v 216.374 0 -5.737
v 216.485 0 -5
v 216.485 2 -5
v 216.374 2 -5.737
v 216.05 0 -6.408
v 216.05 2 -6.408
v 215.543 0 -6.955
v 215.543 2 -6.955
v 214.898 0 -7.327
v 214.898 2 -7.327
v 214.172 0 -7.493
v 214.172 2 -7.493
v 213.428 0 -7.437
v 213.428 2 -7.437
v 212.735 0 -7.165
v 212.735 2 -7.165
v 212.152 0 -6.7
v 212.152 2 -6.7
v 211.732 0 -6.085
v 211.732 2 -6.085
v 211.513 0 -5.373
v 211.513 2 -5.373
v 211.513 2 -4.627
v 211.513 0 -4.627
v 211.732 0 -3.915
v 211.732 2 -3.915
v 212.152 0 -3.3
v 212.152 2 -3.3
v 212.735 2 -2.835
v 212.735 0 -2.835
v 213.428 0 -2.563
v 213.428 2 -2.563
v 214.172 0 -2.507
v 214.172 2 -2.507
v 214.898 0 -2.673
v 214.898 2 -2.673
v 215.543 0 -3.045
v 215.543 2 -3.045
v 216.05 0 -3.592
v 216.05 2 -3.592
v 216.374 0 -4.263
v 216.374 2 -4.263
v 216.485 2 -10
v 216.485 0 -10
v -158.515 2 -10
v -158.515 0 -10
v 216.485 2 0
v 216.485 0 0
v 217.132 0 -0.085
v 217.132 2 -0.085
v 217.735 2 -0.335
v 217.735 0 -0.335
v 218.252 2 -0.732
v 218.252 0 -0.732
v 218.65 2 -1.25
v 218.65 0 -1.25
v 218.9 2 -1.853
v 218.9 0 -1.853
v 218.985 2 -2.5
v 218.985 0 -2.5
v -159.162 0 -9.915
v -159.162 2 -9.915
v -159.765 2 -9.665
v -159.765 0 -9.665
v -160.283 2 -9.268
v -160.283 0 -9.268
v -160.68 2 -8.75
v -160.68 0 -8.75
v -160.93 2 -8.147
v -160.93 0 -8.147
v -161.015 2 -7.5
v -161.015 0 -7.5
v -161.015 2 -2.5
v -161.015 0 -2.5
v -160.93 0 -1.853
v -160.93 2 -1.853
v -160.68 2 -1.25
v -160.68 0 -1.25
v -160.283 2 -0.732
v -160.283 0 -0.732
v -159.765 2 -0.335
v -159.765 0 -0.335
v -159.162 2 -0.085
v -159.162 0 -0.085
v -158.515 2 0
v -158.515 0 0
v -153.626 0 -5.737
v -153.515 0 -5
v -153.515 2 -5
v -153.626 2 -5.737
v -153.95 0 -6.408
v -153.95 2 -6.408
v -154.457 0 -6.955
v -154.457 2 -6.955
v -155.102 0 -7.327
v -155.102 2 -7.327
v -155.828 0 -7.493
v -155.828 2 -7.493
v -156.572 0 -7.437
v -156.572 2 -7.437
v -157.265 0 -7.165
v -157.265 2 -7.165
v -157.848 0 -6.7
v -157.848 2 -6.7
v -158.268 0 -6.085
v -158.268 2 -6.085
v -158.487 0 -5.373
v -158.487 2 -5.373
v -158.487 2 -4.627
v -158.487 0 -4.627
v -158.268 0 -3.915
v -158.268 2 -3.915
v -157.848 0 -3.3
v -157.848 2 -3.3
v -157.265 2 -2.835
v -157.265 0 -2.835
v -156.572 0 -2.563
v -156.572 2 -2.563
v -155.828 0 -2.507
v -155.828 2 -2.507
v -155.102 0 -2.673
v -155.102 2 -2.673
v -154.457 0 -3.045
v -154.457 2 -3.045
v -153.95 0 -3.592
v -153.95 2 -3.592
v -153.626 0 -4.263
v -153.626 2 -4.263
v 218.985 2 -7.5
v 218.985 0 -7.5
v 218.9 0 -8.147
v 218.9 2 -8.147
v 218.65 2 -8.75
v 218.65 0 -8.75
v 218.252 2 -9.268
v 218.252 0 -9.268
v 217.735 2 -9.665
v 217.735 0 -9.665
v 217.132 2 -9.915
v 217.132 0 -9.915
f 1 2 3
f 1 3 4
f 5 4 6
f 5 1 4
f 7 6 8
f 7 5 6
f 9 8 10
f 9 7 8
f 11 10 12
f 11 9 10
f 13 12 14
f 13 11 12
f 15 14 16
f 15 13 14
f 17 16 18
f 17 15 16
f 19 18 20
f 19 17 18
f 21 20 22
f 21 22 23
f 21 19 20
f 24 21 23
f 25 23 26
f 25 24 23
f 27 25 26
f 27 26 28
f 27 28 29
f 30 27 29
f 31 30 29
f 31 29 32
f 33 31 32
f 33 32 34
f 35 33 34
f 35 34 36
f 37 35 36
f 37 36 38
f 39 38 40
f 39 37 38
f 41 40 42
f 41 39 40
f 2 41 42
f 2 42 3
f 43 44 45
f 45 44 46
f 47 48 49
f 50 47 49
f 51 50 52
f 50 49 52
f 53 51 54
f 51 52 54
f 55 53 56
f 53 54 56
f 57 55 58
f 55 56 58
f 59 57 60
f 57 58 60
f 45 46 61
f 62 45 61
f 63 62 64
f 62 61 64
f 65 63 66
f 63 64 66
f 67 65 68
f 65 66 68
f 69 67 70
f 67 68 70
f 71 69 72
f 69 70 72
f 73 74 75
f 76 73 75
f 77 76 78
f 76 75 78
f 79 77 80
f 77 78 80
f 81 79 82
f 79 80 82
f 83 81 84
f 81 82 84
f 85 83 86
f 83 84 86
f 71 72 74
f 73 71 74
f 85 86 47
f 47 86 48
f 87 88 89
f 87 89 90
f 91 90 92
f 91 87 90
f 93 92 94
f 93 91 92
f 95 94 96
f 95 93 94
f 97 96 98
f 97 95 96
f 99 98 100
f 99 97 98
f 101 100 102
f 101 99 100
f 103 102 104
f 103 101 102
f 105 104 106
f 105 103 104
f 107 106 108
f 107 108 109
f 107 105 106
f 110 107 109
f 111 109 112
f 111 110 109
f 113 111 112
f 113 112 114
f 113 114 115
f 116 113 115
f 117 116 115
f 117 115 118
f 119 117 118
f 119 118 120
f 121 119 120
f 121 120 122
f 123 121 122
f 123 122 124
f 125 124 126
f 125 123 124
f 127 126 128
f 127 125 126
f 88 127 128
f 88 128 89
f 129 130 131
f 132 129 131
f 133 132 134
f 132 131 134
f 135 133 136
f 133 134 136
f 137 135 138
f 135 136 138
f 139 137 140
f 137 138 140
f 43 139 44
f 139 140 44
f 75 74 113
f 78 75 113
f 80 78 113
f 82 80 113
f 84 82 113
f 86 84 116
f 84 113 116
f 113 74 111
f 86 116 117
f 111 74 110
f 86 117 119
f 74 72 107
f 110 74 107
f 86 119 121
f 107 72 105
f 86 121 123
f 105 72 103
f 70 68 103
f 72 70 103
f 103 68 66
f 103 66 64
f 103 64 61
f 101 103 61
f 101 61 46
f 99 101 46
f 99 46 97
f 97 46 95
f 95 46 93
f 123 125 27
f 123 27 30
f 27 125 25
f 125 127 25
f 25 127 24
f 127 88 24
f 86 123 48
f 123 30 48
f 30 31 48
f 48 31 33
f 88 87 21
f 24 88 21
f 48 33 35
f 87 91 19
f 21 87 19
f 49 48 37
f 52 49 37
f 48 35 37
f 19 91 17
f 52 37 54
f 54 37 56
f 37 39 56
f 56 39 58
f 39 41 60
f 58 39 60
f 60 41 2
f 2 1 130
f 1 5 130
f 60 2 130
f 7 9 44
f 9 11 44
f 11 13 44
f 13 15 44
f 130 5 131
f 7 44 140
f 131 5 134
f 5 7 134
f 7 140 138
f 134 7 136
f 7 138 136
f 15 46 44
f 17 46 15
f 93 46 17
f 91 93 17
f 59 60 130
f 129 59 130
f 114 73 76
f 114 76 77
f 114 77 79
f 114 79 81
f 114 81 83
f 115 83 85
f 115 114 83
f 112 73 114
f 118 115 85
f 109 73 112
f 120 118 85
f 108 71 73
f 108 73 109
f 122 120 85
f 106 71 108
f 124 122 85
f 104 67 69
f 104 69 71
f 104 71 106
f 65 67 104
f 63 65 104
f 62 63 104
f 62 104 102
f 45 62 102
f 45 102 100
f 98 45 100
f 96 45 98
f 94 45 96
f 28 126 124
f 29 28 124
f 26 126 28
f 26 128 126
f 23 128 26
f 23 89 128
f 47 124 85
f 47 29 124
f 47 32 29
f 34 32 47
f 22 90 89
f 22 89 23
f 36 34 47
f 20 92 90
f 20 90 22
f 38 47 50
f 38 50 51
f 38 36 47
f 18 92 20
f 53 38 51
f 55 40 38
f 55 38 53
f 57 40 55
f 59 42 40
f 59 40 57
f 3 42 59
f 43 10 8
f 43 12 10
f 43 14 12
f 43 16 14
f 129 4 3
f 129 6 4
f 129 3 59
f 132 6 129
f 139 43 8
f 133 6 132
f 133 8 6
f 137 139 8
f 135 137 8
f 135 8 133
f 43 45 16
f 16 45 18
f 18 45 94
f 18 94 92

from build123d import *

# Parameters (mm, degrees)
SKETCH1_R           = 2.5
BOSS_EXTRUDE2_DEPTH = 2
FLEX1_OUTLINE_R     = 2.5
FLEX1_DEPTH         = 2


# Read off the part's stored shape, not the designer's step: Flex1
with BuildPart() as part:
    # Sketch1 → Boss-Extrude2 (new body)
    with BuildSketch(Plane(origin=(0, 0, 0), x_dir=(1, 0, 0), z_dir=(0, 1, 0))):
        with BuildLine():
            Line((2.5, 0), (47.5, 0))
            ThreePointArc((47.5, 0), (49.267766953, 0.732233047), (50, 2.5))
            Line((50, 2.5), (50, 7.5))
            ThreePointArc((50, 7.5), (49.267766953, 9.267766953), (47.5, 10))
            Line((47.5, 10), (2.5, 10))
            ThreePointArc((2.5, 10), (0.732233047, 9.267766953), (0, 7.5))
            Line((0, 7.5), (0, 2.5))
            ThreePointArc((0, 2.5), (0.732233047, 0.732233047), (2.5, 0))
        make_face()
        with Locations(Location((5, 5, 0), (0, 0, 270))):
            Circle(SKETCH1_R, mode=Mode.SUBTRACT)
        with Locations(Location((45, 5, 0), (0, 0, 270))):
            Circle(SKETCH1_R, mode=Mode.SUBTRACT)
    extrude(amount=BOSS_EXTRUDE2_DEPTH)

    # Flex1 outline → Flex1 (add)
    # profile 1 of 4: a face of its own
    with BuildSketch(Plane(origin=(0, 0, 0), x_dir=(1, 0, 0), z_dir=(0, 1, 0))):
        with BuildLine():
            Line((2.5, 10), (-158.5152852, 10))
            ThreePointArc((-158.5152852, 10), (-160.283052153, 9.267766953), (-161.0152852, 7.5))
            Line((-161.0152852, 7.5), (-161.0152852, 2.5))
            ThreePointArc((-161.0152852, 2.5), (-160.283052153, 0.732233047), (-158.5152852, 0))
            Line((-158.5152852, 0), (2.5, 0))
            ThreePointArc((2.5, 0), (0.732233047, 0.732233047), (0, 2.5))
            Line((0, 2.5), (0, 7.5))
            ThreePointArc((0, 7.5), (0.732233047, 9.267766953), (2.5, 10))
        make_face()
        with Locations((-156.0152852, 5)):
            Circle(FLEX1_OUTLINE_R, mode=Mode.SUBTRACT)
    # profile 2 of 4: a face of its own
    with BuildSketch(Plane(origin=(0, 0, 0), x_dir=(1, 0, 0), z_dir=(0, 1, 0))):
        with BuildLine():
            Line((216.4847148, 10), (47.5, 10))
            ThreePointArc((47.5, 10), (49.267766953, 9.267766953), (50, 7.5))
            Line((50, 7.5), (50, 2.5))
            ThreePointArc((50, 2.5), (49.267766953, 0.732233047), (47.5, 0))
            Line((47.5, 0), (216.4847148, 0))
            ThreePointArc((216.4847148, 0), (218.252481753, 0.732233047), (218.9847148, 2.5))
            Line((218.9847148, 2.5), (218.9847148, 7.5))
            ThreePointArc((218.9847148, 7.5), (218.252481753, 9.267766953), (216.4847148, 10))
        make_face()
        with Locations((213.9847148, 5)):
            Circle(FLEX1_OUTLINE_R, mode=Mode.SUBTRACT)
    # profile 3 of 4: a face of its own
    with BuildSketch(Plane(origin=(0, 0, 0), x_dir=(1, 0, 0), z_dir=(0, 1, 0))):
        with Locations((5, 5)):
            Circle(FLEX1_OUTLINE_R)
    # profile 4 of 4: a face of its own
    with BuildSketch(Plane(origin=(0, 0, 0), x_dir=(1, 0, 0), z_dir=(0, 1, 0))):
        with Locations((45, 5)):
            Circle(FLEX1_OUTLINE_R)
    extrude(amount=FLEX1_DEPTH)


solid = part.part
